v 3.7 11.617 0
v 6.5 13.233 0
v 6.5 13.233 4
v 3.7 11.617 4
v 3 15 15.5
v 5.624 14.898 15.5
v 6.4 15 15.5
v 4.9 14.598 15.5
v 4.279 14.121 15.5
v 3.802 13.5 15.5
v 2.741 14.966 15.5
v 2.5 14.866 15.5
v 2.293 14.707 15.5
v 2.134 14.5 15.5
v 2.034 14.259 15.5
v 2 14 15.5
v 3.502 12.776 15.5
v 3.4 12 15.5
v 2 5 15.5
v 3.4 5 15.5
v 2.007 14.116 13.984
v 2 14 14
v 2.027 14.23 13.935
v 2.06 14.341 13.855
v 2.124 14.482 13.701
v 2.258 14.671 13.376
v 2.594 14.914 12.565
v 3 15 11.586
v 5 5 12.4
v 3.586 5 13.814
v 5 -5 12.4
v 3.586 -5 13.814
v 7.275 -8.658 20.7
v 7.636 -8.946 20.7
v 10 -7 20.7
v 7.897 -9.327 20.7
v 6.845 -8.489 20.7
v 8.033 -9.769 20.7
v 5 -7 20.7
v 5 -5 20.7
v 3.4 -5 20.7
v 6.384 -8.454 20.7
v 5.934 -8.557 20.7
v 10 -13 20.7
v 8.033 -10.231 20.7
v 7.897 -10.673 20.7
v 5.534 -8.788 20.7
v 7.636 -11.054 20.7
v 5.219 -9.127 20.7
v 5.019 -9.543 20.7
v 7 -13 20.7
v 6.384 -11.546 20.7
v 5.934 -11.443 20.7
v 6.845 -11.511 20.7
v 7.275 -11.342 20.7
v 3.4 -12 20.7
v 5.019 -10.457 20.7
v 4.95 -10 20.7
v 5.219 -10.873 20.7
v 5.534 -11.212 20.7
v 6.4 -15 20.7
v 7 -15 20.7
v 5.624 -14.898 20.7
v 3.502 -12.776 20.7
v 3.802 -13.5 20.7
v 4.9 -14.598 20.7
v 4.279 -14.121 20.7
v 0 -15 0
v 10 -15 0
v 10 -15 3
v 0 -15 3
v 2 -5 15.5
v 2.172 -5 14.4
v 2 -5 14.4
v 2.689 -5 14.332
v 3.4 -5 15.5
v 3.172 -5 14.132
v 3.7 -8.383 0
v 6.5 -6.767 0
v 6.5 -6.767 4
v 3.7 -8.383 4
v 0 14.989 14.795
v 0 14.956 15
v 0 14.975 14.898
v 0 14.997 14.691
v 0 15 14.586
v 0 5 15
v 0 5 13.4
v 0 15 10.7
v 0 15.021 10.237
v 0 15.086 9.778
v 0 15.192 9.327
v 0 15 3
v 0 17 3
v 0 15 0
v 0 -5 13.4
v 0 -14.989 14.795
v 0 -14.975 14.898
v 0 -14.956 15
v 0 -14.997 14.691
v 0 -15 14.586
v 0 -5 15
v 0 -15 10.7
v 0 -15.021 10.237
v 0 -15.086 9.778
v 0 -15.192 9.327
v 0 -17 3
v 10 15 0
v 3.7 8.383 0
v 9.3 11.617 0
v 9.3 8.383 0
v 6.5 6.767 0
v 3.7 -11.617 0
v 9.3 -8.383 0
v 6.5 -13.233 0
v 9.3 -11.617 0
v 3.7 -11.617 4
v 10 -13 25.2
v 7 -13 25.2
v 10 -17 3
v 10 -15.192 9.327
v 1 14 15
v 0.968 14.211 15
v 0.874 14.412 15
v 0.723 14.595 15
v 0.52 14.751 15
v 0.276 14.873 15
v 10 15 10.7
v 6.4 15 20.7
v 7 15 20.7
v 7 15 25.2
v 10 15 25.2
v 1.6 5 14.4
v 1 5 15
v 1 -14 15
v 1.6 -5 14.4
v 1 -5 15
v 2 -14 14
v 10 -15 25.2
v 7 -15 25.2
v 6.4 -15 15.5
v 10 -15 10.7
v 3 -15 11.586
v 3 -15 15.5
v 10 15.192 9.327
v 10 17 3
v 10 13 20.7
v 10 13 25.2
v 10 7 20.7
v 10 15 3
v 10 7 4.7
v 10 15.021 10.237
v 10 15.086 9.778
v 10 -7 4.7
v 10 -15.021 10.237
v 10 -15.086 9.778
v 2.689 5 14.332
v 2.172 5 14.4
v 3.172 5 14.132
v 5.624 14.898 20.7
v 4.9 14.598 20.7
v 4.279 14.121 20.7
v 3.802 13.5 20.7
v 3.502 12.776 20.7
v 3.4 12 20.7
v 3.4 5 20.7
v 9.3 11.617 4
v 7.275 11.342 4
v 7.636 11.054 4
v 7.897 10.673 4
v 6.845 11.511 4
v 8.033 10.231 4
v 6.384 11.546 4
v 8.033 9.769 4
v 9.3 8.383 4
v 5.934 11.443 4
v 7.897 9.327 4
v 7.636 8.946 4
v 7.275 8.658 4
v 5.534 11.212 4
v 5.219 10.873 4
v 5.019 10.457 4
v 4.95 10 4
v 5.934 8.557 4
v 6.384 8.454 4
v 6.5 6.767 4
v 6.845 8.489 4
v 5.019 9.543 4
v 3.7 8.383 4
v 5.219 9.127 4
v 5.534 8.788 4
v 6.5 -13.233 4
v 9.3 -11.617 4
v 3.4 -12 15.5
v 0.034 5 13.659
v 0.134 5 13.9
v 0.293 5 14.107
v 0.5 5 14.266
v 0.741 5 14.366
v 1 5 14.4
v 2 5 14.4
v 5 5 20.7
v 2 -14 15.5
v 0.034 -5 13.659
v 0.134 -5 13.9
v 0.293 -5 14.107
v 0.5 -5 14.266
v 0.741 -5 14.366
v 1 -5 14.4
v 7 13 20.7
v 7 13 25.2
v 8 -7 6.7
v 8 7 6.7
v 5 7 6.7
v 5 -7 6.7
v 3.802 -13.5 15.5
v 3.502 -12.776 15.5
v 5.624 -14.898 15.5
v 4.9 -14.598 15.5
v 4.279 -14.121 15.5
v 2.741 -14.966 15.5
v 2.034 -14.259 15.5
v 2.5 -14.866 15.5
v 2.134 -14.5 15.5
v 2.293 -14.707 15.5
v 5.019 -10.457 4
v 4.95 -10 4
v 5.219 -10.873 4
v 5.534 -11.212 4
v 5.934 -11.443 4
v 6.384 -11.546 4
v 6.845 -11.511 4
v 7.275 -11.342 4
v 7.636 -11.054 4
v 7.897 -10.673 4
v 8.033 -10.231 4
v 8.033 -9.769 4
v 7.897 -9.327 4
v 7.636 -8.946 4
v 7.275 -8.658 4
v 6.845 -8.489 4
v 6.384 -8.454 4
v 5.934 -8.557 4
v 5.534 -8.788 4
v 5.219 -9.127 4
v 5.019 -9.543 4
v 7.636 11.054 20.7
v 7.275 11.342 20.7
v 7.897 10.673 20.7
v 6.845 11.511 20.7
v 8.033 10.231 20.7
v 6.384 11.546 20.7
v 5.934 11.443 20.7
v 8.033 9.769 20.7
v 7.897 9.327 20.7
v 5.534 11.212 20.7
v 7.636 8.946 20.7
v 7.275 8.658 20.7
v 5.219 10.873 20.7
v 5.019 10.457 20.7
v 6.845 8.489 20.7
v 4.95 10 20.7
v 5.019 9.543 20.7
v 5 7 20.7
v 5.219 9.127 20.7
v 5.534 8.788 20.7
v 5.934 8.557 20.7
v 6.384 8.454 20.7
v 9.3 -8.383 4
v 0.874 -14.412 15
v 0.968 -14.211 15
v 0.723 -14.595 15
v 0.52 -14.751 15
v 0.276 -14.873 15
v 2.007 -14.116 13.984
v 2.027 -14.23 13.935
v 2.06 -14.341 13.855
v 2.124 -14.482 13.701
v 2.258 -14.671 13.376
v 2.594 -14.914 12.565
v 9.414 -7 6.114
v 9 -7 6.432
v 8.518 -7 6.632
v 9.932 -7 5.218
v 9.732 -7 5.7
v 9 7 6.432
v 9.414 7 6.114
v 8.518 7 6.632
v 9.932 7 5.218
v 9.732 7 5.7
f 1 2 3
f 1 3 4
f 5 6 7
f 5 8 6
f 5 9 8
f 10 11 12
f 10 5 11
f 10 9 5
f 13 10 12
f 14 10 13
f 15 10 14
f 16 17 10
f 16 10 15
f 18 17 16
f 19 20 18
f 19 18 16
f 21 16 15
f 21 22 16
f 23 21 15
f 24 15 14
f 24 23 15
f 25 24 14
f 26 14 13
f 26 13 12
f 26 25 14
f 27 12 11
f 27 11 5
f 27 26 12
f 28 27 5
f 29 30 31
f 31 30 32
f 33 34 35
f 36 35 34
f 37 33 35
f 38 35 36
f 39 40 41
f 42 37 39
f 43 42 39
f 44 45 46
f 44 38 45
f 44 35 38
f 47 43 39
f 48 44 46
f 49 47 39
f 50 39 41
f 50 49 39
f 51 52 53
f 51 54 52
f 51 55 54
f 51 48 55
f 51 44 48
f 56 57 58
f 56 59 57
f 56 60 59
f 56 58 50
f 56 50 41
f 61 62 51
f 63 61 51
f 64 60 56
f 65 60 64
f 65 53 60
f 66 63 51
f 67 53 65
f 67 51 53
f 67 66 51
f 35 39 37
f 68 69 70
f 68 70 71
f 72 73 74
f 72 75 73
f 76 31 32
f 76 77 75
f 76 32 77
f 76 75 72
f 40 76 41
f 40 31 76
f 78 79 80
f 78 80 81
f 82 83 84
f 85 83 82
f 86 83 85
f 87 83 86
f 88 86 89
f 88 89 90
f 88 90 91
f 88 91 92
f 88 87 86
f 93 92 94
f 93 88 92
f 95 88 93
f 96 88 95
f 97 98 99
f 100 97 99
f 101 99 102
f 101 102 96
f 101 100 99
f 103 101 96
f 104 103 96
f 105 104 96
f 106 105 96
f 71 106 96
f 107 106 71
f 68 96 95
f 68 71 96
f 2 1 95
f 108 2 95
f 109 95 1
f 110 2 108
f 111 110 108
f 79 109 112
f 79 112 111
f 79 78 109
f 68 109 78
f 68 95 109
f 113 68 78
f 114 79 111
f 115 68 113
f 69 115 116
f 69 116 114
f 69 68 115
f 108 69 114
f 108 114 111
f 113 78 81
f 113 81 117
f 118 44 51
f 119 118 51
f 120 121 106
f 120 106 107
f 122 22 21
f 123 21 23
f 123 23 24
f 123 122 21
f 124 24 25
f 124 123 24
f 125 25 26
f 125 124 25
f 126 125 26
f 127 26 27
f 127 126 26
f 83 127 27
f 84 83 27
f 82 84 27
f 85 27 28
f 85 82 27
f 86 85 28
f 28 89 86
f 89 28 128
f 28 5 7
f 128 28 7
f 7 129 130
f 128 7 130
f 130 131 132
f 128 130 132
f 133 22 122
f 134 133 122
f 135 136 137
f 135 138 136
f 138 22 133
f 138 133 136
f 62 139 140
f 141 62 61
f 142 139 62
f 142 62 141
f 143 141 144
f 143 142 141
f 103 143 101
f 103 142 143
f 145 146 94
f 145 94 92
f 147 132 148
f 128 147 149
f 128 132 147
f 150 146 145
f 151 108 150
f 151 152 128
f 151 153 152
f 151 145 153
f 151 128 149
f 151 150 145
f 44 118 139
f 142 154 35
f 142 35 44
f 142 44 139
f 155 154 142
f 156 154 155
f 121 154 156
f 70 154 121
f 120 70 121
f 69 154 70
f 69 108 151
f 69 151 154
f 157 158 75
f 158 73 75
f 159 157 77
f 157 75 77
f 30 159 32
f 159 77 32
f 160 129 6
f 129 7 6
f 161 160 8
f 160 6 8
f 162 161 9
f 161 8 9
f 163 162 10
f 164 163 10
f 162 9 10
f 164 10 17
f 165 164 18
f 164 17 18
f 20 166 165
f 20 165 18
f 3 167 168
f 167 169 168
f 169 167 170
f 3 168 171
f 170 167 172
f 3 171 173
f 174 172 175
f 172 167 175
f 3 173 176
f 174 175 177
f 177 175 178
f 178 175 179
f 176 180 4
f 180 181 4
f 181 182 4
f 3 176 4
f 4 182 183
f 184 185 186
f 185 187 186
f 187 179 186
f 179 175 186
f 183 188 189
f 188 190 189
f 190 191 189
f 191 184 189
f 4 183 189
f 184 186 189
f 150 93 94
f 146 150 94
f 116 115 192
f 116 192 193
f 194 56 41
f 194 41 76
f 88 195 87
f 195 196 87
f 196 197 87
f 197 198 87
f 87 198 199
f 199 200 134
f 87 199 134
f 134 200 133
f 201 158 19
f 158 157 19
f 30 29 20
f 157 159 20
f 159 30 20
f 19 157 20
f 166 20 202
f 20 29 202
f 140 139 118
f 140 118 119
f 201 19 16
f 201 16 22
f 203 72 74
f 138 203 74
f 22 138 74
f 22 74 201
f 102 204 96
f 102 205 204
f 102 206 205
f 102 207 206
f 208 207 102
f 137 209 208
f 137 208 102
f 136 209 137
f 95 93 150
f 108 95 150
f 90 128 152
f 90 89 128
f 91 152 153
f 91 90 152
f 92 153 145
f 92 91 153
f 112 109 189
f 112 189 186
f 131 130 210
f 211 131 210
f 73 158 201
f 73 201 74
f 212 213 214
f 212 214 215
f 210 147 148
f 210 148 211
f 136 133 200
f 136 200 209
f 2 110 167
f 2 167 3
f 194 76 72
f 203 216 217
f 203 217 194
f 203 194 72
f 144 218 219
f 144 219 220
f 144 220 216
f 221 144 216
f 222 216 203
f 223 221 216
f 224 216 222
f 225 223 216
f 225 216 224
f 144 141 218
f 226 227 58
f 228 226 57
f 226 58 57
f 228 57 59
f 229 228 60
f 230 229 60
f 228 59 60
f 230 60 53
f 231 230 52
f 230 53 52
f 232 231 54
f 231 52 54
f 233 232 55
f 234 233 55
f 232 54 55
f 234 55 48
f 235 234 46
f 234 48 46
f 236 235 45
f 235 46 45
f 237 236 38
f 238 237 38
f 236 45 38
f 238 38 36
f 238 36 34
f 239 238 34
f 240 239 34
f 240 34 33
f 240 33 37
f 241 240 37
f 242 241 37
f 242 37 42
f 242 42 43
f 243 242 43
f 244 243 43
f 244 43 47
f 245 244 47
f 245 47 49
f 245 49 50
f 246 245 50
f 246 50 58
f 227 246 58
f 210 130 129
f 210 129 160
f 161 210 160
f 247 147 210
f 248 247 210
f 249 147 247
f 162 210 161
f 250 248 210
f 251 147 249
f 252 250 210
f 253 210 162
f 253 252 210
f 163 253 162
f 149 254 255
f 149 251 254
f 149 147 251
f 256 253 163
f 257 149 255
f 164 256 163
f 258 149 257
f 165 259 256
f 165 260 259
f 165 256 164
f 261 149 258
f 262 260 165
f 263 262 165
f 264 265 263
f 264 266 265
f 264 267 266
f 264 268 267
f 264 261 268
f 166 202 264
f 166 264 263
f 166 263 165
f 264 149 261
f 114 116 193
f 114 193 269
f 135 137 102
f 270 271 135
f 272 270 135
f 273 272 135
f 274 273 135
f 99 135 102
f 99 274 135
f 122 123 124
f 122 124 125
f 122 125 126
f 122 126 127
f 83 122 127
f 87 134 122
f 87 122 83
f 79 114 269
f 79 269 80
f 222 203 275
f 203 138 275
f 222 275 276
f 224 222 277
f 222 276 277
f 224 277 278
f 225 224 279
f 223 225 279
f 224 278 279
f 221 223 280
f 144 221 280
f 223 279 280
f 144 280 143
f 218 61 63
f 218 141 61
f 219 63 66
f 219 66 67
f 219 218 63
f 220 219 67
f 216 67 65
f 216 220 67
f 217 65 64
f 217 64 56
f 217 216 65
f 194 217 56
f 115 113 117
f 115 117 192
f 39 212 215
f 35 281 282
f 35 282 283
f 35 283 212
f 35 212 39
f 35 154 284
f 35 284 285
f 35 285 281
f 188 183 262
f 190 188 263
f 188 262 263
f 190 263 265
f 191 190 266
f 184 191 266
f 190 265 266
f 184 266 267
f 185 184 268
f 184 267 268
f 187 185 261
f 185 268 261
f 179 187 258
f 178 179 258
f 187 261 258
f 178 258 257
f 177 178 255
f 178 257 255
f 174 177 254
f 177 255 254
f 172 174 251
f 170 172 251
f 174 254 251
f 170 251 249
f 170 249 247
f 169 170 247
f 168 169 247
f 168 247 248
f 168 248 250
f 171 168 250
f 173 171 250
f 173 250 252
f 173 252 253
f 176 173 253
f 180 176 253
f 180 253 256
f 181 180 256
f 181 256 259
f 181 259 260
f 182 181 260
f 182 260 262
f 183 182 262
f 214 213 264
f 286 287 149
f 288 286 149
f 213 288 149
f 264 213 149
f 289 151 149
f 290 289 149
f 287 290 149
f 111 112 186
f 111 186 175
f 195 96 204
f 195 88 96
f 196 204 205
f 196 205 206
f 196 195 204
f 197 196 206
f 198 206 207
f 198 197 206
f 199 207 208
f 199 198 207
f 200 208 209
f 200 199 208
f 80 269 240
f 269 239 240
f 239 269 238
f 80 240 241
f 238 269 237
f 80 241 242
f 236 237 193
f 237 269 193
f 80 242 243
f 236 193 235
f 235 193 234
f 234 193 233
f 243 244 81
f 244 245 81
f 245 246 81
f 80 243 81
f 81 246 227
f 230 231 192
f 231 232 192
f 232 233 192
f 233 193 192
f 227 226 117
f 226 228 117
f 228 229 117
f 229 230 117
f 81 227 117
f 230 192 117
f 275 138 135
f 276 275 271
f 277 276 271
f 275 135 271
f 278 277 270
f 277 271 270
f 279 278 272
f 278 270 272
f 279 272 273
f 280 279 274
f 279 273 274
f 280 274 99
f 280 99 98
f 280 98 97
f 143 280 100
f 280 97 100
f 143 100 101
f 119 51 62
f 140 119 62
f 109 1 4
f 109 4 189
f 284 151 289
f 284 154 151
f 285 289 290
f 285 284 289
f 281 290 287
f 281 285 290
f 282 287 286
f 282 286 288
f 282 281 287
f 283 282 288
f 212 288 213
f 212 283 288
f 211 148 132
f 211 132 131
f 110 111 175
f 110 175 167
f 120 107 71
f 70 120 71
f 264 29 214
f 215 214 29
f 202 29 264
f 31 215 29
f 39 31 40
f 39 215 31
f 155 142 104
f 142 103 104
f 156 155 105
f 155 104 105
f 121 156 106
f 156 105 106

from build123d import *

# Parameters (mm, degrees)
PAD_DEPTH       = 15
SKETCH022_W     = 3
SKETCH022_H     = 2
PAD003_DEPTH    = 4.5
SKETCH024_W     = 14
SKETCH024_H     = 14
POCKET001_DEPTH = 5
SKETCH025_W     = 6.3
SKETCH025_H     = 10
POCKET002_DEPTH = 5.001
SKETCH028_R     = 1.55
POCKET005_DEPTH = 20.701
POCKET006_DEPTH = 4
CHAMFER001_SIZE = 2
FILLET001_R     = 2
FILLET006_R     = 1
FILLET008_R     = 1
FILLET009_R     = 3
FILLET010_R     = 2
PAD005_DEPTH    = 10
FILLET011_R     = 5


with BuildPart() as part:
    # Sketch → Pad (new body, symmetric)
    with BuildSketch(Plane.XZ):
        Polygon((0, 0), (10, 0), (10, 20.7), (3.4, 20.7), (3.4, 15.5), (2, 15.5), (2, 14), (1, 15), (0, 15), align=None)
    extrude(amount=PAD_DEPTH, both=True)

    # Sketch022 → Pad003 (new body)
    with BuildSketch(Plane(origin=(0, 0, 20.7), x_dir=(-1, 0, 0), z_dir=(0, 0, 1))):
        with Locations((-8.5, 14)):
            Rectangle(SKETCH022_W, SKETCH022_H)
        with Locations((-8.5, -14)):
            Rectangle(SKETCH022_W, SKETCH022_H)
    extrude(amount=PAD003_DEPTH)

    # Sketch024 → Pocket001 (cut)
    with BuildSketch(Plane(origin=(10, 0, 0), x_dir=(0, 0, 1), z_dir=(1, 0, 0))):
        with Locations((13.7, 0)):
            Rectangle(SKETCH024_W, SKETCH024_H)
    extrude(amount=-POCKET001_DEPTH, mode=Mode.SUBTRACT)

    # Sketch025 → Pocket002 (cut, through all)
    with BuildSketch(Plane(origin=(5, 0, 0), x_dir=(0, 0, 1), z_dir=(1, 0, 0))):
        with Locations((17.55, 0)):
            Rectangle(SKETCH025_W, SKETCH025_H)
    extrude(amount=-POCKET002_DEPTH, mode=Mode.SUBTRACT)

    # Sketch028 → Pocket005 (cut, through all)
    with BuildSketch(Plane(origin=(0, 0, 20.7), x_dir=(-1, 0, 0), z_dir=(0, 0, 1))):
        with Locations((-6.5, 10)):
            Circle(SKETCH028_R)
        with Locations((-6.5, -10)):
            Circle(SKETCH028_R)
    extrude(amount=-POCKET005_DEPTH, mode=Mode.SUBTRACT)

    # Sketch029 → Pocket006 (cut)
    with BuildSketch(Plane(origin=(0, 0, 0), x_dir=(1, 0, 0), z_dir=(0, 0, -1))):
        Polygon((9.3, 11.616581), (9.3, 8.383419), (6.5, 6.766838), (3.7, 8.383419), (3.7, 11.616581), (6.5, 13.233162), align=None)
        Polygon((6.5, -6.766838), (9.3, -8.383419), (9.3, -11.616581), (6.5, -13.233162), (3.7, -11.616581), (3.7, -8.383419), align=None)
    extrude(amount=-POCKET006_DEPTH, mode=Mode.SUBTRACT)

    # Chamfer001
    chamfer001_edges = [part.edges().sort_by_distance(p)[0] for p in [
        (5, 0, 14.4),
    ]]
    chamfer(chamfer001_edges, length=CHAMFER001_SIZE)

    # Fillet001
    fillet001_edges = [part.edges().sort_by_distance(p)[0] for p in [
        (3, 0, 14.4),
    ]]
    fillet(fillet001_edges, radius=FILLET001_R)

    # Fillet006
    fillet006_edges = [part.edges().sort_by_distance(p)[0] for p in [
        (0, 0, 14.4),
    ]]
    fillet(fillet006_edges, radius=FILLET006_R)

    # Fillet008
    fillet008_edges = [part.edges().sort_by_distance(p)[0] for p in [
        (2, -15, 14.75),
        (1.5, -15, 14.5),
        (1.5, 15, 14.5),
        (2, 15, 14.75),
    ]]
    fillet(fillet008_edges, radius=FILLET008_R)

    # Fillet009
    fillet009_edges = [part.edges().sort_by_distance(p)[0] for p in [
        (3.4, -15, 18.1),
        (3.4, 15, 18.1),
    ]]
    fillet(fillet009_edges, radius=FILLET009_R)

    # Fillet010
    fillet010_edges = [part.edges().sort_by_distance(p)[0] for p in [
        (10, 0, 6.7),
    ]]
    fillet(fillet010_edges, radius=FILLET010_R)

    # Sketch030 → Pad005 (new body)
    with BuildSketch(Plane(origin=(10, 0, 0), x_dir=(0, 0, 1), z_dir=(1, 0, 0))):
        Polygon((3, 15), (10, 15), (3, 17), align=None)
        Polygon((3, -17), (10, -15), (3, -15), align=None)
    extrude(amount=-PAD005_DEPTH)

    # Fillet011
    fillet011_edges = [part.edges().sort_by_distance(p)[0] for p in [
        (5, -15, 10),
        (5, 15, 10),
    ]]
    fillet(fillet011_edges, radius=FILLET011_R)


solid = part.part
